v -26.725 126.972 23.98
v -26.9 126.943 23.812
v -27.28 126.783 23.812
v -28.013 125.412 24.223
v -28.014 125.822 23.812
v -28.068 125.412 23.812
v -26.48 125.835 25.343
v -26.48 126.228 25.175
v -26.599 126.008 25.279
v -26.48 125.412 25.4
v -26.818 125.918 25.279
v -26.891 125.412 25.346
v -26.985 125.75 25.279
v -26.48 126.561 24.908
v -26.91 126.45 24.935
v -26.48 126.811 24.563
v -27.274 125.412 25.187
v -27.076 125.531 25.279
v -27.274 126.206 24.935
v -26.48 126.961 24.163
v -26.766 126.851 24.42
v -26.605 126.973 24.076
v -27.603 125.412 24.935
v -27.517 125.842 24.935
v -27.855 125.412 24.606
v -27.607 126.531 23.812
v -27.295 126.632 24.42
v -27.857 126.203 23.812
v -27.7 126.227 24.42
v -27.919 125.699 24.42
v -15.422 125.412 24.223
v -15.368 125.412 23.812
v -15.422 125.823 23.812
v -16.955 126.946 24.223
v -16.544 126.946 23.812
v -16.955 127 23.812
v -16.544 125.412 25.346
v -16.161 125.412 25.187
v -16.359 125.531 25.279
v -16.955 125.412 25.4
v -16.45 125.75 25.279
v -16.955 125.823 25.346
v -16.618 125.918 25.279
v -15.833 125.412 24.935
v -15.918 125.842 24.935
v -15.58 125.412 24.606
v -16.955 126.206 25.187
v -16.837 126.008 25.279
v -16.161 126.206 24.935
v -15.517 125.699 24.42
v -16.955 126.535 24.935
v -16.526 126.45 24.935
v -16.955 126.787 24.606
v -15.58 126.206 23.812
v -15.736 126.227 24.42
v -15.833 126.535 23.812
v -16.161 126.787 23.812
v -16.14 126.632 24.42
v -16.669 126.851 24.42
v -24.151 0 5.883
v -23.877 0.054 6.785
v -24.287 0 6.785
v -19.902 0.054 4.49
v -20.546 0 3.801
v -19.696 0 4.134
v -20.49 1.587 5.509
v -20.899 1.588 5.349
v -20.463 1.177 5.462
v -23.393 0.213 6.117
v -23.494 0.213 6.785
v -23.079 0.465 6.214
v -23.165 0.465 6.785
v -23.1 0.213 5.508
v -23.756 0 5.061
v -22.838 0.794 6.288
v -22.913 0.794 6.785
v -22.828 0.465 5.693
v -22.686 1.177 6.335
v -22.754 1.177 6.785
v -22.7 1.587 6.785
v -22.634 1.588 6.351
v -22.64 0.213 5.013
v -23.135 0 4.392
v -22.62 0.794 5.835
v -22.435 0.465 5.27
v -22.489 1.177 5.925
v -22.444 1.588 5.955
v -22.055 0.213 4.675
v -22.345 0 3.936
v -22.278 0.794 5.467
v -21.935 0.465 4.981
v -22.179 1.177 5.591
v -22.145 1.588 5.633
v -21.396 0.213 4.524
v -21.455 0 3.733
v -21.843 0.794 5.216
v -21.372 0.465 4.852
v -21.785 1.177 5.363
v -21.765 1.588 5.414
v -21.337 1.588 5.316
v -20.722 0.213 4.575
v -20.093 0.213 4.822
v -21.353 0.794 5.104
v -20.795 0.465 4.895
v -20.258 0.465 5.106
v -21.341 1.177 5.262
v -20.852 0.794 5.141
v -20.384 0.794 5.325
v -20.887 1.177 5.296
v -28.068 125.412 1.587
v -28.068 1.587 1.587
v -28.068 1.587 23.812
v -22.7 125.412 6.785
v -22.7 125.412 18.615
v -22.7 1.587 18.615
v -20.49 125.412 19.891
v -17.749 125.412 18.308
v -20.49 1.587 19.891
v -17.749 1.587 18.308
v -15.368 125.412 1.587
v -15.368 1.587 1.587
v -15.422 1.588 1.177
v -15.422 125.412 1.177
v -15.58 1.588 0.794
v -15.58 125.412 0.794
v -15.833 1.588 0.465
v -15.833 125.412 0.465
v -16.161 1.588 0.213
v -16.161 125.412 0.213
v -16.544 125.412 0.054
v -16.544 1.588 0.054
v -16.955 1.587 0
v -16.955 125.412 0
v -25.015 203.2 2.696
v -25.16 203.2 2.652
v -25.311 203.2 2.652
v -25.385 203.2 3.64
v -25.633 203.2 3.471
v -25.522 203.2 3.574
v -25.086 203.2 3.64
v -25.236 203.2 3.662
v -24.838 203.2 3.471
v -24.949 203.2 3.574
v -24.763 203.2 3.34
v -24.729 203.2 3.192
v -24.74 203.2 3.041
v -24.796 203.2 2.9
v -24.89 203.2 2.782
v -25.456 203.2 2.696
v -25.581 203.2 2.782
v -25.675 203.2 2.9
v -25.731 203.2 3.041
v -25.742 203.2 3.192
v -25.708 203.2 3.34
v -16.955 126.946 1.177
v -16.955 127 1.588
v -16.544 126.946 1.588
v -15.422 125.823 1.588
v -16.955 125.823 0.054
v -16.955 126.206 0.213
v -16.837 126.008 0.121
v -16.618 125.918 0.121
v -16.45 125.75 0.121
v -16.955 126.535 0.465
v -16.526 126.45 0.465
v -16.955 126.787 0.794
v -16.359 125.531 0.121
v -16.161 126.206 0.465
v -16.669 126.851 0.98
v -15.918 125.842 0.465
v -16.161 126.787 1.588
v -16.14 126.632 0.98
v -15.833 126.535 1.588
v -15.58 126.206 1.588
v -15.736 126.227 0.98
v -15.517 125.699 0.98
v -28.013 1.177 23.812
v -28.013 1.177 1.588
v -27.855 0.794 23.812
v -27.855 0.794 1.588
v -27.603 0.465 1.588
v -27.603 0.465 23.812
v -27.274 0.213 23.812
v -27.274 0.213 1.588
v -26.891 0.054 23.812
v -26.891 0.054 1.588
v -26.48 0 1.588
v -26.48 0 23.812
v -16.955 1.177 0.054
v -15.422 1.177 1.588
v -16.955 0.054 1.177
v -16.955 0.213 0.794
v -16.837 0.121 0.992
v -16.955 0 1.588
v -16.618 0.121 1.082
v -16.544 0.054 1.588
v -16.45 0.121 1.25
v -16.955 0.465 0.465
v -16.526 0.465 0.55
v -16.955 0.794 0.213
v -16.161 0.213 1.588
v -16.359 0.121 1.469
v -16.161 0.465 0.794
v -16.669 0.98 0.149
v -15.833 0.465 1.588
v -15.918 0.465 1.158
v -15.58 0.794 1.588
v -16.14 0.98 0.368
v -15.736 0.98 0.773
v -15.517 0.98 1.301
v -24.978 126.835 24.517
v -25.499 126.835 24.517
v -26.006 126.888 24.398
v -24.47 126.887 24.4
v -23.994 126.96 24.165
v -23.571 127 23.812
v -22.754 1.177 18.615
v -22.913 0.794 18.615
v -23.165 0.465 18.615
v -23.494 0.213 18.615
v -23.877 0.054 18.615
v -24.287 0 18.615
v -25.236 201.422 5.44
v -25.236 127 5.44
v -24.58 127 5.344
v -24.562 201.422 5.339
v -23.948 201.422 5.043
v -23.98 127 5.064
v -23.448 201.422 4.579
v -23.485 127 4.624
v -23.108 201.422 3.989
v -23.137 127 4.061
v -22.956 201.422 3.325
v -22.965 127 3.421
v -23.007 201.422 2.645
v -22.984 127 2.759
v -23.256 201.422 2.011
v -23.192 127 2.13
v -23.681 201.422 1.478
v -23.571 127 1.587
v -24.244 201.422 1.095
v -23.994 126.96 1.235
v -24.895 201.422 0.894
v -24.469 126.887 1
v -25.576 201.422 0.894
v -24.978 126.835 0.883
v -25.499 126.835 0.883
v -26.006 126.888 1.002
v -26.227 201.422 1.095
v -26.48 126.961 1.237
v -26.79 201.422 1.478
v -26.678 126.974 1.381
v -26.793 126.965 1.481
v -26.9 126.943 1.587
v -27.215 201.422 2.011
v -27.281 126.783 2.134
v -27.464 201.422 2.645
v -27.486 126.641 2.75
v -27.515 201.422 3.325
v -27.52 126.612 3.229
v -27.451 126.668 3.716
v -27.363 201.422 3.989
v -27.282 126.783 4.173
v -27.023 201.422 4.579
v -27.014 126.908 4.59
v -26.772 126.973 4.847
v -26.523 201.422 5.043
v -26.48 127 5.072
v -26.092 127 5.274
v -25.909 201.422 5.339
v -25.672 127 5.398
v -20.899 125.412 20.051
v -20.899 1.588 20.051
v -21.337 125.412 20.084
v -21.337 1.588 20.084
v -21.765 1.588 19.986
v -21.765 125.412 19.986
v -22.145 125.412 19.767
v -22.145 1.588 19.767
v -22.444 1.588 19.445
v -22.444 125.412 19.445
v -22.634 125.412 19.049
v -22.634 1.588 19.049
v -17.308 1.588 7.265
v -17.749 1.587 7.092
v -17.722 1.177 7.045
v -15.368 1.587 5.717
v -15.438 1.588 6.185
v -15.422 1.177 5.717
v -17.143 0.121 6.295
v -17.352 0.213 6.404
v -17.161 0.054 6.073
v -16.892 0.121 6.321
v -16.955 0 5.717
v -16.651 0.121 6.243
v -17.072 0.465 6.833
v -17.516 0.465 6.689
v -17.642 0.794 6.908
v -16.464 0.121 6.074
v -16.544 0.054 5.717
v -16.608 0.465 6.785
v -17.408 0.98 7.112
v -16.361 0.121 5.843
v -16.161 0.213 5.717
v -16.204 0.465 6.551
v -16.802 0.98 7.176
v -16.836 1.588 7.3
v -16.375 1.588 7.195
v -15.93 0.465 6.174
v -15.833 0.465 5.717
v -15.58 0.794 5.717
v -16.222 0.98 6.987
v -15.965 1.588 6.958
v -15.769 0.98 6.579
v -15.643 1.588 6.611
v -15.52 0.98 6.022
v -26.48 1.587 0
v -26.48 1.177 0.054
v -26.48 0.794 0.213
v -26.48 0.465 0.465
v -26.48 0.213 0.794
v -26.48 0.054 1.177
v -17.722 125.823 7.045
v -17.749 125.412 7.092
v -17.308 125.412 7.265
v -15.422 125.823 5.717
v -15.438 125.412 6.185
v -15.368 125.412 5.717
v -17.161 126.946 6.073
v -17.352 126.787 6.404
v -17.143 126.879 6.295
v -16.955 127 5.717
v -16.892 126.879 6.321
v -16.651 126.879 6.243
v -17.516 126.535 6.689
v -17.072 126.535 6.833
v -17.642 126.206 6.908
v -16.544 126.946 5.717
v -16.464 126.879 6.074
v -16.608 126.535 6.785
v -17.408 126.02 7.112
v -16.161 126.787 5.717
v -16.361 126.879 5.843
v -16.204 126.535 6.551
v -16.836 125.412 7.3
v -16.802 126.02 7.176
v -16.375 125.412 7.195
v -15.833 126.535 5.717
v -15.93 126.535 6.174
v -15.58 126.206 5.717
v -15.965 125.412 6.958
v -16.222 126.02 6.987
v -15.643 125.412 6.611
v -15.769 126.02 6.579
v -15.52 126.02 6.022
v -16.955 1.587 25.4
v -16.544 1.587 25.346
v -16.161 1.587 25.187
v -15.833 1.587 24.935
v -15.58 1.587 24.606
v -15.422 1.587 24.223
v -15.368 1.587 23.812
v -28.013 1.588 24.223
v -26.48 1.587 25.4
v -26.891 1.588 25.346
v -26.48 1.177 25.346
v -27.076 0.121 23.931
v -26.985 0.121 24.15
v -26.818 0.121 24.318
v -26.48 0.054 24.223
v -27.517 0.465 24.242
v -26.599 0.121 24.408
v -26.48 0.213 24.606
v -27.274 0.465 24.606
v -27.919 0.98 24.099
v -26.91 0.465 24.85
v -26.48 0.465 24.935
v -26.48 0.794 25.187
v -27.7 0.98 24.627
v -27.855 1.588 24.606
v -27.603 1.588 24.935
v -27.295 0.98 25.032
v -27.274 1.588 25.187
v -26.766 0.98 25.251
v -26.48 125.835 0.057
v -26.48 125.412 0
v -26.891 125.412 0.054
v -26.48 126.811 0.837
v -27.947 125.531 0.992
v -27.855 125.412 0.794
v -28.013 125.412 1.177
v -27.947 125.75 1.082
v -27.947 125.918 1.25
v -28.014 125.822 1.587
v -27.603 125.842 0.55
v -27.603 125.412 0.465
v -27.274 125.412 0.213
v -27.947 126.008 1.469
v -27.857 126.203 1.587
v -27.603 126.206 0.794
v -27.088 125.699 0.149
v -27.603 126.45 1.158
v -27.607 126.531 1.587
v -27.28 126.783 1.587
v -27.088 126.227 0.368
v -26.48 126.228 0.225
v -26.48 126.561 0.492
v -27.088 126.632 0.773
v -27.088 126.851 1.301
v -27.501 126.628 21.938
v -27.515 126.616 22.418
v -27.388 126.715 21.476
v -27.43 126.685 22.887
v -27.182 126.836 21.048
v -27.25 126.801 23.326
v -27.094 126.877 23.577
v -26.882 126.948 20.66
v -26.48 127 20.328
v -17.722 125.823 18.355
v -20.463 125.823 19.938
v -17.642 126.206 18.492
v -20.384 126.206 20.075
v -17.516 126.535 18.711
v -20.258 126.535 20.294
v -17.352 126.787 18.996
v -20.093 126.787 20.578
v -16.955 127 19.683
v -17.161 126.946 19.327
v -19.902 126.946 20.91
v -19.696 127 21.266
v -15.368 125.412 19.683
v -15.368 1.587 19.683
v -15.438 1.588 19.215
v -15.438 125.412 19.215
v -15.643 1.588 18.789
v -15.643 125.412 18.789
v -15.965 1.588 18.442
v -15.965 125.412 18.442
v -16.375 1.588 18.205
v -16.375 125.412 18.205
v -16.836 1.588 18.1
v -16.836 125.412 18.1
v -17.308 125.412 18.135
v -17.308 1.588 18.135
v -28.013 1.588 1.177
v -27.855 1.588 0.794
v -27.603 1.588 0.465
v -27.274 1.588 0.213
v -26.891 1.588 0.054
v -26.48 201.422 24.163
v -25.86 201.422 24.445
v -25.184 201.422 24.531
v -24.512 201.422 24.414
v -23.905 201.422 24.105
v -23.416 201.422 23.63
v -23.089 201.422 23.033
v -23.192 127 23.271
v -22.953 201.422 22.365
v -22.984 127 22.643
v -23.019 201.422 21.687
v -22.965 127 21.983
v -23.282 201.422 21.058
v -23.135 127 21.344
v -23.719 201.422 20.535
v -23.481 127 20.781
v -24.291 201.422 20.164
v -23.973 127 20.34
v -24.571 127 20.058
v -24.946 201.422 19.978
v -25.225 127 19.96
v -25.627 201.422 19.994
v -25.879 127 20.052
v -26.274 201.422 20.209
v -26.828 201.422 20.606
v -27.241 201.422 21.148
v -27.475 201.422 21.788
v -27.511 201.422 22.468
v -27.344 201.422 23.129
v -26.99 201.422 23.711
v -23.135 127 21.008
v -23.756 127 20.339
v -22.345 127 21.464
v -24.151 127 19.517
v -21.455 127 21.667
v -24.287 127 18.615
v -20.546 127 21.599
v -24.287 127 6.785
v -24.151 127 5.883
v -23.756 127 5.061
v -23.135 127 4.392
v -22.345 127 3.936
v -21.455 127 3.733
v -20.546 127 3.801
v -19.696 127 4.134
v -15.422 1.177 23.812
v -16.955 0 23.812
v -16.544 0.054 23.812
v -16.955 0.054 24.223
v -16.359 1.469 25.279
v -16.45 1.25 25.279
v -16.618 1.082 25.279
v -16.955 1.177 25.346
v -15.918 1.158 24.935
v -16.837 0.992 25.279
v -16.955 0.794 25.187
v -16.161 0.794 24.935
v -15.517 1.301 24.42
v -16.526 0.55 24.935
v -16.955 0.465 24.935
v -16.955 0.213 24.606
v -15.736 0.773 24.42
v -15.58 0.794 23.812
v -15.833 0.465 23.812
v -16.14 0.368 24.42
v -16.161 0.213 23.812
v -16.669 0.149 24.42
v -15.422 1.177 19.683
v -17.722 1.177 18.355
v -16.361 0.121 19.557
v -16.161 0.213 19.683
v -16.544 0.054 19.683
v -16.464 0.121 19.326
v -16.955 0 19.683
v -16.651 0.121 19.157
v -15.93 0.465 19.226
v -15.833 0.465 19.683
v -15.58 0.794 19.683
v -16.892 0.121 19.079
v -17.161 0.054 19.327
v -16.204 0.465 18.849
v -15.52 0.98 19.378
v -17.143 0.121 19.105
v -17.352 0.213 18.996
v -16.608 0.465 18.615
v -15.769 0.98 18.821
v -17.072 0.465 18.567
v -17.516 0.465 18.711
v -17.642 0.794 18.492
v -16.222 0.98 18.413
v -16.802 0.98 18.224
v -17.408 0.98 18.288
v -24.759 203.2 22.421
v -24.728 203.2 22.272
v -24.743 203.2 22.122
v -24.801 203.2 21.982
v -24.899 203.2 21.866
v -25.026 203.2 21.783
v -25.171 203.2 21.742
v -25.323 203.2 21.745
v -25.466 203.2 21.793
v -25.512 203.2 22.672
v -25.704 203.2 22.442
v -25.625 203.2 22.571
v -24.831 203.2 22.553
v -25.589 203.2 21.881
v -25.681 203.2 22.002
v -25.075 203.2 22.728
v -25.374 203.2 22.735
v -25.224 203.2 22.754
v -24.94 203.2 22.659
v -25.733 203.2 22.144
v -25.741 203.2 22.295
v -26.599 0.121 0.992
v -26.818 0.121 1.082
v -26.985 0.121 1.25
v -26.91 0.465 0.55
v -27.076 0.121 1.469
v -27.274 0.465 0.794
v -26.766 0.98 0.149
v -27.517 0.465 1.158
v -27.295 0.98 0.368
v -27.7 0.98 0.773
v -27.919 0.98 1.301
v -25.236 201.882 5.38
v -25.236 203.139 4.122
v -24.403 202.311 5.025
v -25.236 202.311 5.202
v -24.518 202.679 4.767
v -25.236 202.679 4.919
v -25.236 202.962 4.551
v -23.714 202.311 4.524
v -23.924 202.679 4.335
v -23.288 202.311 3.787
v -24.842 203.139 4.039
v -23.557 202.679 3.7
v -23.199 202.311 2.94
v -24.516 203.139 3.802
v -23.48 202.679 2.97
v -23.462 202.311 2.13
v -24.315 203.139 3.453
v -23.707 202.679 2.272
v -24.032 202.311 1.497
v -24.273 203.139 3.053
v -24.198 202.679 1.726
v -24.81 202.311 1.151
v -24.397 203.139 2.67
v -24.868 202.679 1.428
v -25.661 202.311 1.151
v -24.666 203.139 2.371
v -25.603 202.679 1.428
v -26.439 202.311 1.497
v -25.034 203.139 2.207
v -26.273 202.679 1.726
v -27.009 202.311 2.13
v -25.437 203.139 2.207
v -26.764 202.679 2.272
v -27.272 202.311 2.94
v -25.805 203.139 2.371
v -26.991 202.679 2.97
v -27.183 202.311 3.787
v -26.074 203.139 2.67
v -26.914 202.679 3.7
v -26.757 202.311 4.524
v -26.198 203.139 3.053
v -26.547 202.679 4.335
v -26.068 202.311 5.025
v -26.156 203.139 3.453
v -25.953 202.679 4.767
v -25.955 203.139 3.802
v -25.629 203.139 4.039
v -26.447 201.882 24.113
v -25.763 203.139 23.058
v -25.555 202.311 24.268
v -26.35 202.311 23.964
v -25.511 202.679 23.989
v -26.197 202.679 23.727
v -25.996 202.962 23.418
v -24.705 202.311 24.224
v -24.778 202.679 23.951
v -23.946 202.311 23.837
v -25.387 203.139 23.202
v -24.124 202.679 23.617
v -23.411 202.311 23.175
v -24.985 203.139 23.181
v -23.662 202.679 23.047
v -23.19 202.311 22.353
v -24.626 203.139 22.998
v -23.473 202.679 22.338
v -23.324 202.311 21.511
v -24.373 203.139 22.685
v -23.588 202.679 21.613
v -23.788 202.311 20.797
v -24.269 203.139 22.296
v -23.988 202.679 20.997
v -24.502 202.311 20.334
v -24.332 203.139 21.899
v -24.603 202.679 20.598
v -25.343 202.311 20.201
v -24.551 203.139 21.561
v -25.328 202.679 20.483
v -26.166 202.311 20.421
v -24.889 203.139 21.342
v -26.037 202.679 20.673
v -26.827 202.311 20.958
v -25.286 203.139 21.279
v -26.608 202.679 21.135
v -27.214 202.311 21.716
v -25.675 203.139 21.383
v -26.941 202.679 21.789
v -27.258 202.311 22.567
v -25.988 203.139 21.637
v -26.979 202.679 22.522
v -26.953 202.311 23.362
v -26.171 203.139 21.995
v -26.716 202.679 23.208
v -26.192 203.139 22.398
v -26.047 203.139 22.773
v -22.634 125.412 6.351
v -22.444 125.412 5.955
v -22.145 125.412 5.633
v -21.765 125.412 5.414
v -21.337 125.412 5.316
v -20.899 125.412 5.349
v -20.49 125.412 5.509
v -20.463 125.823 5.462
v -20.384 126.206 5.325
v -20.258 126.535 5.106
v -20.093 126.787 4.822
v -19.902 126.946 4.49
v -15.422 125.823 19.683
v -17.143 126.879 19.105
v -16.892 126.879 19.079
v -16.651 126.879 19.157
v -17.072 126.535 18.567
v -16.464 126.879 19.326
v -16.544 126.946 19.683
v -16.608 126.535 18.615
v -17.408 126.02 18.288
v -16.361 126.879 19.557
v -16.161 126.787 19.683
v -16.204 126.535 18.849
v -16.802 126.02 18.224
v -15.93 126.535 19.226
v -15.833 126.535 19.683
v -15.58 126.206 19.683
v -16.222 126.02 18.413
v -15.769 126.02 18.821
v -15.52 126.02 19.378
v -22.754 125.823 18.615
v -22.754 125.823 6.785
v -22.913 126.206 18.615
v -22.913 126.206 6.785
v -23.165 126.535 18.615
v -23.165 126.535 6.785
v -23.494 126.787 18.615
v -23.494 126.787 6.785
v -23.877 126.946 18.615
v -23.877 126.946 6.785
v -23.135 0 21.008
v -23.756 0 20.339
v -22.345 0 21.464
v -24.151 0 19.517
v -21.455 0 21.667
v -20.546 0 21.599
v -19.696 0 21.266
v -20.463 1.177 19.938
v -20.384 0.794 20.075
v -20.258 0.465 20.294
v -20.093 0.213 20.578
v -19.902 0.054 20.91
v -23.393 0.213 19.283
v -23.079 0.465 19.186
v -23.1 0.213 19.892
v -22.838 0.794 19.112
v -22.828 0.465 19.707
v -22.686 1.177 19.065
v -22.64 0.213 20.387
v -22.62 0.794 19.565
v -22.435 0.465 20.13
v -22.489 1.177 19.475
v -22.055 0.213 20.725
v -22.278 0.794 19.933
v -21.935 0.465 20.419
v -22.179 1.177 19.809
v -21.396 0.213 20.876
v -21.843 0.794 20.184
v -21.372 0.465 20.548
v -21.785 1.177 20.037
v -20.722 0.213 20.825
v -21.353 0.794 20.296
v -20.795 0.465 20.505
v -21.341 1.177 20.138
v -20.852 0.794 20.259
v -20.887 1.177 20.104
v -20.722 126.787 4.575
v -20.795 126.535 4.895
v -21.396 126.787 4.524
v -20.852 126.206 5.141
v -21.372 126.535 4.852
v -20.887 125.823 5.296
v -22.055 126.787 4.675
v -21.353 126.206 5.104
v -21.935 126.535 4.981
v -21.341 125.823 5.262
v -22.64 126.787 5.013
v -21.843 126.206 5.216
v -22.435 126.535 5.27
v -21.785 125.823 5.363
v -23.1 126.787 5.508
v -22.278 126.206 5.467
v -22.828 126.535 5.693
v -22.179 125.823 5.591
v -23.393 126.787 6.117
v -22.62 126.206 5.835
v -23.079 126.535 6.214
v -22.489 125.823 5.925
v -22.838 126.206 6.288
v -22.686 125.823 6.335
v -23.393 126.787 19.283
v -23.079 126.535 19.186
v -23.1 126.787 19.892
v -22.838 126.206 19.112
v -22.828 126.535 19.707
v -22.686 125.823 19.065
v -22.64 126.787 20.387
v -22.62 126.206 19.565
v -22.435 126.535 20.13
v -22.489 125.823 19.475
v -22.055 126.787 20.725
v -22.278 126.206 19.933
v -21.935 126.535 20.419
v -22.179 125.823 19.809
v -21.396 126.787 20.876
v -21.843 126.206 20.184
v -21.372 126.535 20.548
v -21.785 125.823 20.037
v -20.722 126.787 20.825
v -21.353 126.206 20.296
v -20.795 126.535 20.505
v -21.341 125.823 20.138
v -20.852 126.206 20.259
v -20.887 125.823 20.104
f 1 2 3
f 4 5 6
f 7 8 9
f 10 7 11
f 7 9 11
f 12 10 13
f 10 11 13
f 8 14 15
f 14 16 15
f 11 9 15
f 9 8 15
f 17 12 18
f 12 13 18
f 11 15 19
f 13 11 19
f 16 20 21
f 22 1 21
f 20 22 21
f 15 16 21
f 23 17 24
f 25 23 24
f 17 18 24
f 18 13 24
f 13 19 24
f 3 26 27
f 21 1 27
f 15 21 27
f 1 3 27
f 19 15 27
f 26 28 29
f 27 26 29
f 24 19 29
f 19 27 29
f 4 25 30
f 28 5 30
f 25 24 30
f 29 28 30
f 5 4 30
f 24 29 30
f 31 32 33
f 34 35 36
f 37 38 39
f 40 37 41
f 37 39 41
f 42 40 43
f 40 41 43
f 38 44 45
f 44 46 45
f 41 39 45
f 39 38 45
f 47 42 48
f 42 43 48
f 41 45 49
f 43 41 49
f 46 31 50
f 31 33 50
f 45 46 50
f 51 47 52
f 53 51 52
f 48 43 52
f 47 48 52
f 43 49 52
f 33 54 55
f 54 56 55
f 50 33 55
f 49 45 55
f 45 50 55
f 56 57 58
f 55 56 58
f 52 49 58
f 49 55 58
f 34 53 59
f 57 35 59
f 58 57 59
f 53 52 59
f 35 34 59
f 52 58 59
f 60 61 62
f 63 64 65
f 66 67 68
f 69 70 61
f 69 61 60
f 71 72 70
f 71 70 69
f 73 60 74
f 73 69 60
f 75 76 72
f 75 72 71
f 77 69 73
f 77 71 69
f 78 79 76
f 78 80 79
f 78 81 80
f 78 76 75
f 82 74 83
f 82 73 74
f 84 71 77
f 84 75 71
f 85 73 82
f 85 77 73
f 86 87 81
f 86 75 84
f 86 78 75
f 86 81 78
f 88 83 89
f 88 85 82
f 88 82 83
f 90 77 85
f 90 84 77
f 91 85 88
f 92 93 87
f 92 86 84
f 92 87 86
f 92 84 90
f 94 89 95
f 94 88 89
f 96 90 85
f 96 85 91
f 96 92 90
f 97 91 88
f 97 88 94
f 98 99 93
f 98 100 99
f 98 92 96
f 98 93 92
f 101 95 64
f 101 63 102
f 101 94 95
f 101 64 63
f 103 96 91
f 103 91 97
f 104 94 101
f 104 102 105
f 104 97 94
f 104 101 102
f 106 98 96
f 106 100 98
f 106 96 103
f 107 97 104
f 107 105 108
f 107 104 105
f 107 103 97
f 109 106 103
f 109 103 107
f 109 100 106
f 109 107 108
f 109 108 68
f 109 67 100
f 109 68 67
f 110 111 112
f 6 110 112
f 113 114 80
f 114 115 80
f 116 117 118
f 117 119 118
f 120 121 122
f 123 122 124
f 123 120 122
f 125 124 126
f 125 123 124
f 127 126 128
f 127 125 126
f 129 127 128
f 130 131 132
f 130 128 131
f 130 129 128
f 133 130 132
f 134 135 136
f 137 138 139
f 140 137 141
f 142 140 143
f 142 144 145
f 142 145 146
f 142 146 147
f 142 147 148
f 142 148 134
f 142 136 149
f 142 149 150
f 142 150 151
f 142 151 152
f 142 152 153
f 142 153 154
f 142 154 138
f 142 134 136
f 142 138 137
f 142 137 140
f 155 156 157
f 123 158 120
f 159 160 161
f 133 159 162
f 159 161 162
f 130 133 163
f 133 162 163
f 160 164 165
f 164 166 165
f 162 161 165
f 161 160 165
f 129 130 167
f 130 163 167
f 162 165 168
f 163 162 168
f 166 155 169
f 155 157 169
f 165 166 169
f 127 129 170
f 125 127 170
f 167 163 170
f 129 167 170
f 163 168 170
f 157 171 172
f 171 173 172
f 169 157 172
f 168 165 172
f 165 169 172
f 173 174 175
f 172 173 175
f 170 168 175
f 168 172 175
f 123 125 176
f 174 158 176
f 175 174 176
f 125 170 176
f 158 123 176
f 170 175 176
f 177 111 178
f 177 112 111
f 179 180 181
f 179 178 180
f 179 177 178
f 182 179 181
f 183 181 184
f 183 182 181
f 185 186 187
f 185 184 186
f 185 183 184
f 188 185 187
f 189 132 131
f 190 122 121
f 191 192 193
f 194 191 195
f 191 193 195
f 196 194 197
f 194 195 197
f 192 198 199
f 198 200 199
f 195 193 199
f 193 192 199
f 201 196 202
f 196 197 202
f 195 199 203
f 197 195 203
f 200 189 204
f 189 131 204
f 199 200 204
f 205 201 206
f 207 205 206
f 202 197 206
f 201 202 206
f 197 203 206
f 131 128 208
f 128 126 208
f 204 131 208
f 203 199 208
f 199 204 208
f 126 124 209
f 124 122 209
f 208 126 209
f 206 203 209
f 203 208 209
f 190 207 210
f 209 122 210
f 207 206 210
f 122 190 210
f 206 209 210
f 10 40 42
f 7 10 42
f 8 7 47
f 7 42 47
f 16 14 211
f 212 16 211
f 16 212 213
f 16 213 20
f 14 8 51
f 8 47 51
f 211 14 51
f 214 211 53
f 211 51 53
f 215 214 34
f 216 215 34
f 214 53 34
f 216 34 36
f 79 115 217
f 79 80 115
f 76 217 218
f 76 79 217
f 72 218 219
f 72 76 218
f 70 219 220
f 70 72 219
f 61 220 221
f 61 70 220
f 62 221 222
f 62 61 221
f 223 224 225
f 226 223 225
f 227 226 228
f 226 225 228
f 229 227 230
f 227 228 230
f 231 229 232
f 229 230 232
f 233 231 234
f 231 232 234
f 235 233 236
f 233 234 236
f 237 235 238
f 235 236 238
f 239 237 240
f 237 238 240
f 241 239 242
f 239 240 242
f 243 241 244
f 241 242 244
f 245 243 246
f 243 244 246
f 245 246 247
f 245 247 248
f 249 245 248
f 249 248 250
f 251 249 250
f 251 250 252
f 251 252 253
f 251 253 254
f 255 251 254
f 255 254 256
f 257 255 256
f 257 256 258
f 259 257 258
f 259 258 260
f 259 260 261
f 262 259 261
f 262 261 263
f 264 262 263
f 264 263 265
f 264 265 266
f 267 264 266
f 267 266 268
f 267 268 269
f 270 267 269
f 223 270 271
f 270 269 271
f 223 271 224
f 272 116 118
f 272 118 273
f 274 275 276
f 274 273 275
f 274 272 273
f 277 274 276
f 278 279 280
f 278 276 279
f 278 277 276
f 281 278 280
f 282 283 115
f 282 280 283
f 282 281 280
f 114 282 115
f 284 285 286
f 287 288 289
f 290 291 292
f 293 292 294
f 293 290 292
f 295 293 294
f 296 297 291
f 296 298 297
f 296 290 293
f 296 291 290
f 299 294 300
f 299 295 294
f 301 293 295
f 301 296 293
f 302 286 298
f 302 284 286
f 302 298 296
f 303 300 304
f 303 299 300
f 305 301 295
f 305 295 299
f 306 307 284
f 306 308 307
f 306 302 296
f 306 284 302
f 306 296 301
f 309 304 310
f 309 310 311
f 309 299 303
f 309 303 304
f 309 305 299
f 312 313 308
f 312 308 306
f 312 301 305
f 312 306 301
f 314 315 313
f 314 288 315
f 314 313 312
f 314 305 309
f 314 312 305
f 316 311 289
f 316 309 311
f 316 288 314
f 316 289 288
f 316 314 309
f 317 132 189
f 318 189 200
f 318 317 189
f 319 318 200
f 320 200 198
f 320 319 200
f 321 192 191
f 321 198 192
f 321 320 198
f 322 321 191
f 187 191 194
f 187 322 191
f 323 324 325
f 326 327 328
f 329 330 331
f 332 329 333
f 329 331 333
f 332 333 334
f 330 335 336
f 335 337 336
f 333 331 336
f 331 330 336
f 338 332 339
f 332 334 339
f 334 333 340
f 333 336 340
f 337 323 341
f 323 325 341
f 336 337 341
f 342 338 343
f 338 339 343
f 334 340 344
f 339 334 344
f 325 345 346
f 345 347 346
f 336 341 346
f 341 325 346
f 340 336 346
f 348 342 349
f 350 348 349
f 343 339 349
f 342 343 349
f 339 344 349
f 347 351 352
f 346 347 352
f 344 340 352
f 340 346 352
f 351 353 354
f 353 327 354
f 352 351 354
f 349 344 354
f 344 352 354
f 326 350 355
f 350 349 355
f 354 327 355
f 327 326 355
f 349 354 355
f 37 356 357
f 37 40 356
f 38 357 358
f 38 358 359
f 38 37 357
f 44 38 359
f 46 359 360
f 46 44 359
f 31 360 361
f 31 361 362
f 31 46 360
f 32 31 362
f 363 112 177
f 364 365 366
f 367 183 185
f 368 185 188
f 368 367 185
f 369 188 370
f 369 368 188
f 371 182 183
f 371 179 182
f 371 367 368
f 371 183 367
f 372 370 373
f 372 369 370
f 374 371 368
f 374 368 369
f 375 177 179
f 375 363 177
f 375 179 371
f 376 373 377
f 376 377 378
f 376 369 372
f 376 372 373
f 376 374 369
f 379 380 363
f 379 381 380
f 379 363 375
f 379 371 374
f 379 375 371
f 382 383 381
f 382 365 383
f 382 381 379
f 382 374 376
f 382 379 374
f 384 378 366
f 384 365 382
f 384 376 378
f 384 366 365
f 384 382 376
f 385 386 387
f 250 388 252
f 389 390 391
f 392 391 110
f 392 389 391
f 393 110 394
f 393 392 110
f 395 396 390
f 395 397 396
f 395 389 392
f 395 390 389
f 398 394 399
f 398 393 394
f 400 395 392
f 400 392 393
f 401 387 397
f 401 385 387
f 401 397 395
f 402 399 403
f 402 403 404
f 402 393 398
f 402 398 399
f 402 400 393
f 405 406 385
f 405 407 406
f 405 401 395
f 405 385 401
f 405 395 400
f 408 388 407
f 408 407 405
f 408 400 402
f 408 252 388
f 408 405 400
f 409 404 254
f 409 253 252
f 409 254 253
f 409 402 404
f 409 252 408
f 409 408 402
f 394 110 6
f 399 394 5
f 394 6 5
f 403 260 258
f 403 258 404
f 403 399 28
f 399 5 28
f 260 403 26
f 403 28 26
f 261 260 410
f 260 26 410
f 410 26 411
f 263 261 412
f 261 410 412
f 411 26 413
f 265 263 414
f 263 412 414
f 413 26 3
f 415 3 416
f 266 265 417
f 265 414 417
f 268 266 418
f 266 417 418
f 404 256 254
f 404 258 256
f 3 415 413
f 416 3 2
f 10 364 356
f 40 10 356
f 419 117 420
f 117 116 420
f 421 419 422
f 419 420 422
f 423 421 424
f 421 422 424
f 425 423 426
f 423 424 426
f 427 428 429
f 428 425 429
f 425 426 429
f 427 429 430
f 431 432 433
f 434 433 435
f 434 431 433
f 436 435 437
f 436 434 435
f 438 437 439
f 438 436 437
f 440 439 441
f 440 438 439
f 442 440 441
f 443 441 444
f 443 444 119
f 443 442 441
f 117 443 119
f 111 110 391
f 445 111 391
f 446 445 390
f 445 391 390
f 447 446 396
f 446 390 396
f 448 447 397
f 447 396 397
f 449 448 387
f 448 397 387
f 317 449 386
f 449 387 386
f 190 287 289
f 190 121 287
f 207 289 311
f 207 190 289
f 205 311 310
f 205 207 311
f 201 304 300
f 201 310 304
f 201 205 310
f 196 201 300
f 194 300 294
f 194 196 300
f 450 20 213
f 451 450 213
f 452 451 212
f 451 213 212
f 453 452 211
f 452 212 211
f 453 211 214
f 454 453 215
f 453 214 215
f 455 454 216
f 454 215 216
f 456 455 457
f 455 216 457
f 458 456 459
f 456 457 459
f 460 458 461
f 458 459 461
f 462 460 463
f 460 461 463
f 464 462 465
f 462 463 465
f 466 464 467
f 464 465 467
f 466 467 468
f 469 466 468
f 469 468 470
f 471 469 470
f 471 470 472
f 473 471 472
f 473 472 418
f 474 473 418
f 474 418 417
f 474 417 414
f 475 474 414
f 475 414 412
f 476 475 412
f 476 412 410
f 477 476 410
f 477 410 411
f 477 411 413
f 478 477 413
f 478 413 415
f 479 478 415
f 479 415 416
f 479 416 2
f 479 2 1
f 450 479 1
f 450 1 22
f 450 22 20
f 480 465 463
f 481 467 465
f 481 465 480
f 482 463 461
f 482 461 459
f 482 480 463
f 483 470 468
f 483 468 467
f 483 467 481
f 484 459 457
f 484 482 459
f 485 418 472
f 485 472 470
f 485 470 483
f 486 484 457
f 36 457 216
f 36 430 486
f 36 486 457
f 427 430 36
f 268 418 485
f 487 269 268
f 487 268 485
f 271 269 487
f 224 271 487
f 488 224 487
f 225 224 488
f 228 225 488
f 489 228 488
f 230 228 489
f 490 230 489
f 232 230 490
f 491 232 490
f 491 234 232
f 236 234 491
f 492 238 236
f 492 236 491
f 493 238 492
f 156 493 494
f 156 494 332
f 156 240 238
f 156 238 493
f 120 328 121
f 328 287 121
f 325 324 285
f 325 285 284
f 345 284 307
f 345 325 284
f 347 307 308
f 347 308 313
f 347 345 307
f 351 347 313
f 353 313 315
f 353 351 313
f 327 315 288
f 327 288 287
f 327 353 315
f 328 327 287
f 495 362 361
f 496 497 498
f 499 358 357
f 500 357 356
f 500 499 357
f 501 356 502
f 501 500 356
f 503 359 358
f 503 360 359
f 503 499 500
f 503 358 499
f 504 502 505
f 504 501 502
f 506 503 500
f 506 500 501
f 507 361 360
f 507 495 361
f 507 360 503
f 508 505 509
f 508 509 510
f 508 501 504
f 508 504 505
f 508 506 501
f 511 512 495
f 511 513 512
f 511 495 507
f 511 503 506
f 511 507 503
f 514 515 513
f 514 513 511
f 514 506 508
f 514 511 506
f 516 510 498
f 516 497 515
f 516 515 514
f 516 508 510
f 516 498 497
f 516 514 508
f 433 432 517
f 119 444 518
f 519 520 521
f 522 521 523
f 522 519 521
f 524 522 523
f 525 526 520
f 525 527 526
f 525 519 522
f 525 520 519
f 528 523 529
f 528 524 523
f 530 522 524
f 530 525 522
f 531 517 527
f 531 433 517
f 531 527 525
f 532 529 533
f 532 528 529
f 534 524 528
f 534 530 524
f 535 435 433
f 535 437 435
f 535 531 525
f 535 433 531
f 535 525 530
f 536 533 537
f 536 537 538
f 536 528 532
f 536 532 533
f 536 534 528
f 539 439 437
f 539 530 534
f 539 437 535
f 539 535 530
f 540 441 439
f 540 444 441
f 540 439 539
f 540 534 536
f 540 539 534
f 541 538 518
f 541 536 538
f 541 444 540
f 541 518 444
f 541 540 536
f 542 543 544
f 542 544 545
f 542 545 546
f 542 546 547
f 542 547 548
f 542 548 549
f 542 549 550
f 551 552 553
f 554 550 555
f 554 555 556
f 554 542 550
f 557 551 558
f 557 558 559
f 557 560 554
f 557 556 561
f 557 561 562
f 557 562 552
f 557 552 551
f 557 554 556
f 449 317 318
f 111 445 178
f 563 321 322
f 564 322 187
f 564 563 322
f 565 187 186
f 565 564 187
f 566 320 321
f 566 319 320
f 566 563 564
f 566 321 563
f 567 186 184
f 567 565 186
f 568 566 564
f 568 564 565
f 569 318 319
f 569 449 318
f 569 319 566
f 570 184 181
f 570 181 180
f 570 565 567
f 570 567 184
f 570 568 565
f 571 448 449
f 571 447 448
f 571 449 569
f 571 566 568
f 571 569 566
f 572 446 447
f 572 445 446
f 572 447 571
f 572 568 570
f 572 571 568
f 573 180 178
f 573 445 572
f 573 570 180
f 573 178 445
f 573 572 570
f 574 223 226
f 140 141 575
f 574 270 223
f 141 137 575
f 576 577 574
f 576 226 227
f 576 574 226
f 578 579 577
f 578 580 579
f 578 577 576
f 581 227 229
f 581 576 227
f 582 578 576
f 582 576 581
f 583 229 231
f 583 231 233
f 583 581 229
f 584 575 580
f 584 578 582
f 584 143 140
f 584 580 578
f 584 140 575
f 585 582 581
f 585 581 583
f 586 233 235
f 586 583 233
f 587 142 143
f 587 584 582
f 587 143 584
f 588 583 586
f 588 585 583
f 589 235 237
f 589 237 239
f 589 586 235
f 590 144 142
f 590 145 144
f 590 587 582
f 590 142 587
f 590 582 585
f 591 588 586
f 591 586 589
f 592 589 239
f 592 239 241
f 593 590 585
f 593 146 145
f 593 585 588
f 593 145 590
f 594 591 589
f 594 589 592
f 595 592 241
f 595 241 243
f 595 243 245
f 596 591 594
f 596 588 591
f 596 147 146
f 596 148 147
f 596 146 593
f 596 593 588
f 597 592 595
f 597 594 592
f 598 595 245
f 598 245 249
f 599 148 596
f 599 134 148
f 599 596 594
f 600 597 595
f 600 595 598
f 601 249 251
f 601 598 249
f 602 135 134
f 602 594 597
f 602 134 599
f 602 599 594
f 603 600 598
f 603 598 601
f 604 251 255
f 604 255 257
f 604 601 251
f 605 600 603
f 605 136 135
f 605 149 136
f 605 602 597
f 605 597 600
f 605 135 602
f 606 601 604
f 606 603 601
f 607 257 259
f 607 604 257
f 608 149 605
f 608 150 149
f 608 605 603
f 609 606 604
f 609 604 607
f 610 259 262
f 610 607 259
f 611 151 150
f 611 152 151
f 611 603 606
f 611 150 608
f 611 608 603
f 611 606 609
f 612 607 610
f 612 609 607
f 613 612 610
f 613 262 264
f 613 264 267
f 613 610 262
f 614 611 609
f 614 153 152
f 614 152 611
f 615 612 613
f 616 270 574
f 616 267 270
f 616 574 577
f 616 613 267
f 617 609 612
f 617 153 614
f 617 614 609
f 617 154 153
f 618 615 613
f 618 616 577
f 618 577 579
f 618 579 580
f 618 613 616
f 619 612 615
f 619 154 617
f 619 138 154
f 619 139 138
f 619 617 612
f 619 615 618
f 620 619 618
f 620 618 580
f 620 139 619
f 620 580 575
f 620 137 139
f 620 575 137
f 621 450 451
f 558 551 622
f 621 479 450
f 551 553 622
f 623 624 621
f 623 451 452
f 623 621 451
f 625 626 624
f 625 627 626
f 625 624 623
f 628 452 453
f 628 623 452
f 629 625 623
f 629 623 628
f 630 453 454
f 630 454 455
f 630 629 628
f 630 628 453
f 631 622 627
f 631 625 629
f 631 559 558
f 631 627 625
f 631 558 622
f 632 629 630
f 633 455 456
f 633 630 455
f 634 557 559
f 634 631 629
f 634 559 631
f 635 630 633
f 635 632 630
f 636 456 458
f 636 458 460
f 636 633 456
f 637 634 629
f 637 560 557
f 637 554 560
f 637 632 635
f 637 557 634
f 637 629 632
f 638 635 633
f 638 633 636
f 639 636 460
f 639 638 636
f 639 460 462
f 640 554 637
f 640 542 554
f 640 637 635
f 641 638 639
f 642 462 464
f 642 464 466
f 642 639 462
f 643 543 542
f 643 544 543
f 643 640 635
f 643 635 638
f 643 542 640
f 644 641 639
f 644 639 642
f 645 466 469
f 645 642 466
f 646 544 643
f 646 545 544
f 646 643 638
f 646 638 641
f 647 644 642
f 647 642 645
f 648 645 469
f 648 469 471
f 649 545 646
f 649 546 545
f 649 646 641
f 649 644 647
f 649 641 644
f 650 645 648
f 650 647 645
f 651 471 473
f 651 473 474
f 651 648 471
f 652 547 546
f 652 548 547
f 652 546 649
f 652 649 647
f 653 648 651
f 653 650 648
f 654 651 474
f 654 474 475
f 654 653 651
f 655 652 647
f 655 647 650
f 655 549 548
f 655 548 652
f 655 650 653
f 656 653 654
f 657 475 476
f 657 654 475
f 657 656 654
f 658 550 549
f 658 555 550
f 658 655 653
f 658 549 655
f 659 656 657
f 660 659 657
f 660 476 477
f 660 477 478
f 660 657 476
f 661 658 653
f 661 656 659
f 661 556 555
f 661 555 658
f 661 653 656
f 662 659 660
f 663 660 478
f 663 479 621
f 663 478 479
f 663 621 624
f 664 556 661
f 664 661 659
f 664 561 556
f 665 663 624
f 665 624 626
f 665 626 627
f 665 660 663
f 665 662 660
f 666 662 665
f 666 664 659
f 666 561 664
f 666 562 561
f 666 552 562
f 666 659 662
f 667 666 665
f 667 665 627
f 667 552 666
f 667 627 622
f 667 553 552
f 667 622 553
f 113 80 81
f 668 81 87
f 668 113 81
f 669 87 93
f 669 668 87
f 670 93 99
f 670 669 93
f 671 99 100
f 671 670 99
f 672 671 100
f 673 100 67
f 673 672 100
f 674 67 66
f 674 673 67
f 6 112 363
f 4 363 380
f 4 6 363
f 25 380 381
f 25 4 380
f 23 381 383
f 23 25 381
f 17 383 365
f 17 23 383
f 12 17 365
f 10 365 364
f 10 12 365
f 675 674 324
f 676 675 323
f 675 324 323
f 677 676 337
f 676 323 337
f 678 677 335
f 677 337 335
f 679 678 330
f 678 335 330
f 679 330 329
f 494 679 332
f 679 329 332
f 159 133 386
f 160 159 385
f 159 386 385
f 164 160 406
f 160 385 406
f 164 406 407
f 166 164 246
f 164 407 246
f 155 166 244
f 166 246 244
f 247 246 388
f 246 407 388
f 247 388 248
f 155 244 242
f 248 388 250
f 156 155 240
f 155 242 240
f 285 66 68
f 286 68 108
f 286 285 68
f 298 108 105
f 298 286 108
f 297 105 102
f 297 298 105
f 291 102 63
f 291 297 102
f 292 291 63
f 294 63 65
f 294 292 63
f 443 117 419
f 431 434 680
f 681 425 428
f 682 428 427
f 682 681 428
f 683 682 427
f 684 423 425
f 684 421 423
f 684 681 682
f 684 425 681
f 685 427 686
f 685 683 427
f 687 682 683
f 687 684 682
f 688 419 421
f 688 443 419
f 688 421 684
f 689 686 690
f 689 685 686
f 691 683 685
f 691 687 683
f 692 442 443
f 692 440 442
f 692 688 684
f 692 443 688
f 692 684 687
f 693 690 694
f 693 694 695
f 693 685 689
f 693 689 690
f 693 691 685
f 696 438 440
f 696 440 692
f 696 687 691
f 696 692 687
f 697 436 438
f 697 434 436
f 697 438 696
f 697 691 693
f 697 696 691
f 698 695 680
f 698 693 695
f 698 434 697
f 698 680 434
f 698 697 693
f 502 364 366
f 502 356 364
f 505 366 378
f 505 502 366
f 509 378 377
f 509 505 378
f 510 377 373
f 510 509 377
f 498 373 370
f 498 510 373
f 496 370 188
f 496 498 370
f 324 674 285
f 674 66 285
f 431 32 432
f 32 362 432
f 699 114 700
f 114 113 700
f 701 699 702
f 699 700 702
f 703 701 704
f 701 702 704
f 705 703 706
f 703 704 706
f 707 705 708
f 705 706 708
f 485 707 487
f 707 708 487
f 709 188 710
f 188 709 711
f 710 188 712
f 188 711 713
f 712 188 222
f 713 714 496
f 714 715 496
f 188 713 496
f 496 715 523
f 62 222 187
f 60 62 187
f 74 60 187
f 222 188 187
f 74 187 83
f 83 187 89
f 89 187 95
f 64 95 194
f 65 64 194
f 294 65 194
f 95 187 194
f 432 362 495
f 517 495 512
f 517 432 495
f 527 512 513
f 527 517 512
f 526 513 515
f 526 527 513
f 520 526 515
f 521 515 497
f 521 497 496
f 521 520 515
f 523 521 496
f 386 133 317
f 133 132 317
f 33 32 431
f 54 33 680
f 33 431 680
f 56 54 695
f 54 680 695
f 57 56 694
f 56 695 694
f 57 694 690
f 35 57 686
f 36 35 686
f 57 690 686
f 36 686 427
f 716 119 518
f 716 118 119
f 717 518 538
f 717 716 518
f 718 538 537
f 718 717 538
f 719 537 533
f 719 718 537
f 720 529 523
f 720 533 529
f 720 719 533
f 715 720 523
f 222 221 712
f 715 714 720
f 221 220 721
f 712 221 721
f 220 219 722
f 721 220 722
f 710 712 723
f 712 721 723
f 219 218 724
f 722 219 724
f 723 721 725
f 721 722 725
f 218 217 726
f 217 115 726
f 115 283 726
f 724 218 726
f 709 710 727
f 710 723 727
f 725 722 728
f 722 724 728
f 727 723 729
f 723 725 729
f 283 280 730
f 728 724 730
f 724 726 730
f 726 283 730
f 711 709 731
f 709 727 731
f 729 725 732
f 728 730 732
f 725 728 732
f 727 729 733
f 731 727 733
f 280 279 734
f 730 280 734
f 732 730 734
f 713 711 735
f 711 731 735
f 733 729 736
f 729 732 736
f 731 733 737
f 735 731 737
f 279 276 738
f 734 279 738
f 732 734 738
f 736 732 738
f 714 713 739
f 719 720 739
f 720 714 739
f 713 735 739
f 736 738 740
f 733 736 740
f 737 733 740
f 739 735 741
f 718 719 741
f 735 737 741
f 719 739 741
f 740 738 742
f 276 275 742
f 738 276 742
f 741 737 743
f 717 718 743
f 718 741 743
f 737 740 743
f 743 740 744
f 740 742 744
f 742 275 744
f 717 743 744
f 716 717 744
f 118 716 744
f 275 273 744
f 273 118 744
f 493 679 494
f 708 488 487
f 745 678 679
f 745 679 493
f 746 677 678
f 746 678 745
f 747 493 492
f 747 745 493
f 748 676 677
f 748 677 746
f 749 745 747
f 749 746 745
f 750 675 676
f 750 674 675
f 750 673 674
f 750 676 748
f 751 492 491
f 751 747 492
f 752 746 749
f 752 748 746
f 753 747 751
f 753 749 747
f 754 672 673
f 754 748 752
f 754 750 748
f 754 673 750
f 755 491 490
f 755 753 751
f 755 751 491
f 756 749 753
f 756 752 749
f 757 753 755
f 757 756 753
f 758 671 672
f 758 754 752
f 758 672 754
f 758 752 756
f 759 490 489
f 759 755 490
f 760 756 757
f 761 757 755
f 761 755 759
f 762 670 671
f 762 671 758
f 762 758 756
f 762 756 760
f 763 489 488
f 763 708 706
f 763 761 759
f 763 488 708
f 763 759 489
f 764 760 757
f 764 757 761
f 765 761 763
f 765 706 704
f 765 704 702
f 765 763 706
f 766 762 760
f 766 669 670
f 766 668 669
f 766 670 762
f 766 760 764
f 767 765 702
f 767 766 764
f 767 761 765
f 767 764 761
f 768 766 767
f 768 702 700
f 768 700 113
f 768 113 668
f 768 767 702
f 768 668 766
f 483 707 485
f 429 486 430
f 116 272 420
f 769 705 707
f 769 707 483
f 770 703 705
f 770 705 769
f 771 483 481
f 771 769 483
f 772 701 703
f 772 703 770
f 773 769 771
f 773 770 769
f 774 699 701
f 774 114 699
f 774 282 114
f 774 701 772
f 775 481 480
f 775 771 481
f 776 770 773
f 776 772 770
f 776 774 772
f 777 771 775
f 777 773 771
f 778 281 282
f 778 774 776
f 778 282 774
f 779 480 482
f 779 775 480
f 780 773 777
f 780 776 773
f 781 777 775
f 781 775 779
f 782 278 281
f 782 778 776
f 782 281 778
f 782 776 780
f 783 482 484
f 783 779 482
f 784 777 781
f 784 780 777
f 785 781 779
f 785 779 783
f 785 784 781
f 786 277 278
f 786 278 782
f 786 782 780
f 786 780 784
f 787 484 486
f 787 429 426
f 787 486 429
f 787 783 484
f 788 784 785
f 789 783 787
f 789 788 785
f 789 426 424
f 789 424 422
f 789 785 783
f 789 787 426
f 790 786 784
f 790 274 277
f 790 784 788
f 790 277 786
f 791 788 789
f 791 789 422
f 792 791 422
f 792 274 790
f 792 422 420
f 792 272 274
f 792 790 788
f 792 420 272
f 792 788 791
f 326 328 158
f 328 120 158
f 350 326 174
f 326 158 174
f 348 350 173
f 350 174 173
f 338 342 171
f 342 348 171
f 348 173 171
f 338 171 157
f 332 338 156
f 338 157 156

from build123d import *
from OCP.BRepFilletAPI import BRepFilletAPI_MakeFillet

# Parameters (mm, degrees)
BOSS_EXTRUDE2_DEPTH      = 127
FILLET1_R1               = 1.5875
FILLET1_R2               = 1.4732
BOSS_EXTRUDE3_DEPTH      = 76.2
BOSS_EXTRUDE3_DEPTH_BACK = 2.54
SKETCH2_R                = 2.286
FILLET2_R                = 1.778


with BuildPart() as part:
    # Sketch1 → Boss-Extrude2 (new body)
    with BuildSketch(Plane(origin=(0, 0, 0), x_dir=(1, 0, 0), z_dir=(0, 1, 0))):
        Polygon((-28.067579909, 0), (-28.067579909, -25.4), (-15.367579909, -25.4), (-15.367579909, -16.933333333), (-22.699928279, -21.166666582), (-22.699928279, -4.233333249), (-15.367579909, -8.466666667), (-15.367579909, 0), align=None)
    extrude(amount=BOSS_EXTRUDE2_DEPTH)

    # Fillet1: one fillet with a radius per group of edges: ONE call of the kernel's fillet builder (fillet() takes one radius for all edges)
    fillet1_edges_1 = [part.edges().sort_by_distance(p)[0] for p in [
        (-19.033754094, 127, 6.349999958),
        (-22.699928279, 127, 12.699999915),
        (-19.033754094, 127, 19.049999958),
        (-15.367579909, 127, 21.166666667),
        (-15.367579909, 127, 4.233333333),
        (-21.717579909, 127, 0),
        (-28.067579909, 63.5, 0),
        (-15.367579909, 63.5, 0),
        (-21.717579909, 0, 0),
        (-15.367579909, 0, 4.233333333),
        (-15.367579909, 63.5, 8.466666667),
        (-15.367579909, 63.5, 16.933333333),
        (-15.367579909, 0, 21.166666667),
        (-15.367579909, 63.5, 25.4),
        (-22.699928279, 0, 12.699999915),
        (-28.067579909, 127, 12.7),
        (-21.717579909, 127, 25.4),
        (-28.067579909, 63.5, 25.4),
        (-28.067579909, 0, 12.7),
        (-21.717579909, 0, 25.4),
        (-19.033754094, 0, 6.349999958),
        (-19.033754094, 0, 19.049999958),
    ]]
    fillet1_edges_2 = [part.edges().sort_by_distance(p)[0] for p in [
        (-22.699928279, 63.5, 4.233333249),
        (-22.699928279, 63.5, 21.166666582),
    ]]
    fillet1 = BRepFilletAPI_MakeFillet(part.part.solid().wrapped)
    for e in fillet1_edges_1:
        fillet1.Add(FILLET1_R1, e.wrapped)
    for e in fillet1_edges_2:
        fillet1.Add(FILLET1_R2, e.wrapped)
    add(Compound.cast(fillet1.Shape()), mode=Mode.REPLACE)

    # Sketch2 → Boss-Extrude3 (add, two sides: drawn at the far end of the back side and taken through both)
    with BuildSketch(Plane(origin=(0, 127, 0), x_dir=(1, 0, 0), z_dir=(0, 1, 0)).offset(-BOSS_EXTRUDE3_DEPTH_BACK)):
        with Locations((-25.235504788, -3.154170131)):
            Circle(SKETCH2_R)
        with Locations((-25.235504788, -22.245829751)):
            Circle(SKETCH2_R)
    extrude(amount=BOSS_EXTRUDE3_DEPTH + BOSS_EXTRUDE3_DEPTH_BACK)

    # Fillet2
    fillet2_edges = [part.edges().sort_by_distance(p)[0] for p in [
        (-27.521504788, 203.2, 3.154170131),
        (-27.521504788, 203.2, 22.245829751),
    ]]
    fillet(fillet2_edges, radius=FILLET2_R)


solid = part.part
